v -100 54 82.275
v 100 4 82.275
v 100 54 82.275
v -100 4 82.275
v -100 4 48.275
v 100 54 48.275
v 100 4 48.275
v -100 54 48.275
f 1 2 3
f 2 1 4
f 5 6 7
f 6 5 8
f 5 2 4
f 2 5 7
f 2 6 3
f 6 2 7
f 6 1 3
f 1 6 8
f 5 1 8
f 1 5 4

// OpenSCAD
// Placeholder power strip for the viewer only (NOT a part): 200 x 50 x 34, sitting on the CBL-C ledges at U2.
translate([-100,4,44.45+0.325+3.5])cube([200,50,34]);
